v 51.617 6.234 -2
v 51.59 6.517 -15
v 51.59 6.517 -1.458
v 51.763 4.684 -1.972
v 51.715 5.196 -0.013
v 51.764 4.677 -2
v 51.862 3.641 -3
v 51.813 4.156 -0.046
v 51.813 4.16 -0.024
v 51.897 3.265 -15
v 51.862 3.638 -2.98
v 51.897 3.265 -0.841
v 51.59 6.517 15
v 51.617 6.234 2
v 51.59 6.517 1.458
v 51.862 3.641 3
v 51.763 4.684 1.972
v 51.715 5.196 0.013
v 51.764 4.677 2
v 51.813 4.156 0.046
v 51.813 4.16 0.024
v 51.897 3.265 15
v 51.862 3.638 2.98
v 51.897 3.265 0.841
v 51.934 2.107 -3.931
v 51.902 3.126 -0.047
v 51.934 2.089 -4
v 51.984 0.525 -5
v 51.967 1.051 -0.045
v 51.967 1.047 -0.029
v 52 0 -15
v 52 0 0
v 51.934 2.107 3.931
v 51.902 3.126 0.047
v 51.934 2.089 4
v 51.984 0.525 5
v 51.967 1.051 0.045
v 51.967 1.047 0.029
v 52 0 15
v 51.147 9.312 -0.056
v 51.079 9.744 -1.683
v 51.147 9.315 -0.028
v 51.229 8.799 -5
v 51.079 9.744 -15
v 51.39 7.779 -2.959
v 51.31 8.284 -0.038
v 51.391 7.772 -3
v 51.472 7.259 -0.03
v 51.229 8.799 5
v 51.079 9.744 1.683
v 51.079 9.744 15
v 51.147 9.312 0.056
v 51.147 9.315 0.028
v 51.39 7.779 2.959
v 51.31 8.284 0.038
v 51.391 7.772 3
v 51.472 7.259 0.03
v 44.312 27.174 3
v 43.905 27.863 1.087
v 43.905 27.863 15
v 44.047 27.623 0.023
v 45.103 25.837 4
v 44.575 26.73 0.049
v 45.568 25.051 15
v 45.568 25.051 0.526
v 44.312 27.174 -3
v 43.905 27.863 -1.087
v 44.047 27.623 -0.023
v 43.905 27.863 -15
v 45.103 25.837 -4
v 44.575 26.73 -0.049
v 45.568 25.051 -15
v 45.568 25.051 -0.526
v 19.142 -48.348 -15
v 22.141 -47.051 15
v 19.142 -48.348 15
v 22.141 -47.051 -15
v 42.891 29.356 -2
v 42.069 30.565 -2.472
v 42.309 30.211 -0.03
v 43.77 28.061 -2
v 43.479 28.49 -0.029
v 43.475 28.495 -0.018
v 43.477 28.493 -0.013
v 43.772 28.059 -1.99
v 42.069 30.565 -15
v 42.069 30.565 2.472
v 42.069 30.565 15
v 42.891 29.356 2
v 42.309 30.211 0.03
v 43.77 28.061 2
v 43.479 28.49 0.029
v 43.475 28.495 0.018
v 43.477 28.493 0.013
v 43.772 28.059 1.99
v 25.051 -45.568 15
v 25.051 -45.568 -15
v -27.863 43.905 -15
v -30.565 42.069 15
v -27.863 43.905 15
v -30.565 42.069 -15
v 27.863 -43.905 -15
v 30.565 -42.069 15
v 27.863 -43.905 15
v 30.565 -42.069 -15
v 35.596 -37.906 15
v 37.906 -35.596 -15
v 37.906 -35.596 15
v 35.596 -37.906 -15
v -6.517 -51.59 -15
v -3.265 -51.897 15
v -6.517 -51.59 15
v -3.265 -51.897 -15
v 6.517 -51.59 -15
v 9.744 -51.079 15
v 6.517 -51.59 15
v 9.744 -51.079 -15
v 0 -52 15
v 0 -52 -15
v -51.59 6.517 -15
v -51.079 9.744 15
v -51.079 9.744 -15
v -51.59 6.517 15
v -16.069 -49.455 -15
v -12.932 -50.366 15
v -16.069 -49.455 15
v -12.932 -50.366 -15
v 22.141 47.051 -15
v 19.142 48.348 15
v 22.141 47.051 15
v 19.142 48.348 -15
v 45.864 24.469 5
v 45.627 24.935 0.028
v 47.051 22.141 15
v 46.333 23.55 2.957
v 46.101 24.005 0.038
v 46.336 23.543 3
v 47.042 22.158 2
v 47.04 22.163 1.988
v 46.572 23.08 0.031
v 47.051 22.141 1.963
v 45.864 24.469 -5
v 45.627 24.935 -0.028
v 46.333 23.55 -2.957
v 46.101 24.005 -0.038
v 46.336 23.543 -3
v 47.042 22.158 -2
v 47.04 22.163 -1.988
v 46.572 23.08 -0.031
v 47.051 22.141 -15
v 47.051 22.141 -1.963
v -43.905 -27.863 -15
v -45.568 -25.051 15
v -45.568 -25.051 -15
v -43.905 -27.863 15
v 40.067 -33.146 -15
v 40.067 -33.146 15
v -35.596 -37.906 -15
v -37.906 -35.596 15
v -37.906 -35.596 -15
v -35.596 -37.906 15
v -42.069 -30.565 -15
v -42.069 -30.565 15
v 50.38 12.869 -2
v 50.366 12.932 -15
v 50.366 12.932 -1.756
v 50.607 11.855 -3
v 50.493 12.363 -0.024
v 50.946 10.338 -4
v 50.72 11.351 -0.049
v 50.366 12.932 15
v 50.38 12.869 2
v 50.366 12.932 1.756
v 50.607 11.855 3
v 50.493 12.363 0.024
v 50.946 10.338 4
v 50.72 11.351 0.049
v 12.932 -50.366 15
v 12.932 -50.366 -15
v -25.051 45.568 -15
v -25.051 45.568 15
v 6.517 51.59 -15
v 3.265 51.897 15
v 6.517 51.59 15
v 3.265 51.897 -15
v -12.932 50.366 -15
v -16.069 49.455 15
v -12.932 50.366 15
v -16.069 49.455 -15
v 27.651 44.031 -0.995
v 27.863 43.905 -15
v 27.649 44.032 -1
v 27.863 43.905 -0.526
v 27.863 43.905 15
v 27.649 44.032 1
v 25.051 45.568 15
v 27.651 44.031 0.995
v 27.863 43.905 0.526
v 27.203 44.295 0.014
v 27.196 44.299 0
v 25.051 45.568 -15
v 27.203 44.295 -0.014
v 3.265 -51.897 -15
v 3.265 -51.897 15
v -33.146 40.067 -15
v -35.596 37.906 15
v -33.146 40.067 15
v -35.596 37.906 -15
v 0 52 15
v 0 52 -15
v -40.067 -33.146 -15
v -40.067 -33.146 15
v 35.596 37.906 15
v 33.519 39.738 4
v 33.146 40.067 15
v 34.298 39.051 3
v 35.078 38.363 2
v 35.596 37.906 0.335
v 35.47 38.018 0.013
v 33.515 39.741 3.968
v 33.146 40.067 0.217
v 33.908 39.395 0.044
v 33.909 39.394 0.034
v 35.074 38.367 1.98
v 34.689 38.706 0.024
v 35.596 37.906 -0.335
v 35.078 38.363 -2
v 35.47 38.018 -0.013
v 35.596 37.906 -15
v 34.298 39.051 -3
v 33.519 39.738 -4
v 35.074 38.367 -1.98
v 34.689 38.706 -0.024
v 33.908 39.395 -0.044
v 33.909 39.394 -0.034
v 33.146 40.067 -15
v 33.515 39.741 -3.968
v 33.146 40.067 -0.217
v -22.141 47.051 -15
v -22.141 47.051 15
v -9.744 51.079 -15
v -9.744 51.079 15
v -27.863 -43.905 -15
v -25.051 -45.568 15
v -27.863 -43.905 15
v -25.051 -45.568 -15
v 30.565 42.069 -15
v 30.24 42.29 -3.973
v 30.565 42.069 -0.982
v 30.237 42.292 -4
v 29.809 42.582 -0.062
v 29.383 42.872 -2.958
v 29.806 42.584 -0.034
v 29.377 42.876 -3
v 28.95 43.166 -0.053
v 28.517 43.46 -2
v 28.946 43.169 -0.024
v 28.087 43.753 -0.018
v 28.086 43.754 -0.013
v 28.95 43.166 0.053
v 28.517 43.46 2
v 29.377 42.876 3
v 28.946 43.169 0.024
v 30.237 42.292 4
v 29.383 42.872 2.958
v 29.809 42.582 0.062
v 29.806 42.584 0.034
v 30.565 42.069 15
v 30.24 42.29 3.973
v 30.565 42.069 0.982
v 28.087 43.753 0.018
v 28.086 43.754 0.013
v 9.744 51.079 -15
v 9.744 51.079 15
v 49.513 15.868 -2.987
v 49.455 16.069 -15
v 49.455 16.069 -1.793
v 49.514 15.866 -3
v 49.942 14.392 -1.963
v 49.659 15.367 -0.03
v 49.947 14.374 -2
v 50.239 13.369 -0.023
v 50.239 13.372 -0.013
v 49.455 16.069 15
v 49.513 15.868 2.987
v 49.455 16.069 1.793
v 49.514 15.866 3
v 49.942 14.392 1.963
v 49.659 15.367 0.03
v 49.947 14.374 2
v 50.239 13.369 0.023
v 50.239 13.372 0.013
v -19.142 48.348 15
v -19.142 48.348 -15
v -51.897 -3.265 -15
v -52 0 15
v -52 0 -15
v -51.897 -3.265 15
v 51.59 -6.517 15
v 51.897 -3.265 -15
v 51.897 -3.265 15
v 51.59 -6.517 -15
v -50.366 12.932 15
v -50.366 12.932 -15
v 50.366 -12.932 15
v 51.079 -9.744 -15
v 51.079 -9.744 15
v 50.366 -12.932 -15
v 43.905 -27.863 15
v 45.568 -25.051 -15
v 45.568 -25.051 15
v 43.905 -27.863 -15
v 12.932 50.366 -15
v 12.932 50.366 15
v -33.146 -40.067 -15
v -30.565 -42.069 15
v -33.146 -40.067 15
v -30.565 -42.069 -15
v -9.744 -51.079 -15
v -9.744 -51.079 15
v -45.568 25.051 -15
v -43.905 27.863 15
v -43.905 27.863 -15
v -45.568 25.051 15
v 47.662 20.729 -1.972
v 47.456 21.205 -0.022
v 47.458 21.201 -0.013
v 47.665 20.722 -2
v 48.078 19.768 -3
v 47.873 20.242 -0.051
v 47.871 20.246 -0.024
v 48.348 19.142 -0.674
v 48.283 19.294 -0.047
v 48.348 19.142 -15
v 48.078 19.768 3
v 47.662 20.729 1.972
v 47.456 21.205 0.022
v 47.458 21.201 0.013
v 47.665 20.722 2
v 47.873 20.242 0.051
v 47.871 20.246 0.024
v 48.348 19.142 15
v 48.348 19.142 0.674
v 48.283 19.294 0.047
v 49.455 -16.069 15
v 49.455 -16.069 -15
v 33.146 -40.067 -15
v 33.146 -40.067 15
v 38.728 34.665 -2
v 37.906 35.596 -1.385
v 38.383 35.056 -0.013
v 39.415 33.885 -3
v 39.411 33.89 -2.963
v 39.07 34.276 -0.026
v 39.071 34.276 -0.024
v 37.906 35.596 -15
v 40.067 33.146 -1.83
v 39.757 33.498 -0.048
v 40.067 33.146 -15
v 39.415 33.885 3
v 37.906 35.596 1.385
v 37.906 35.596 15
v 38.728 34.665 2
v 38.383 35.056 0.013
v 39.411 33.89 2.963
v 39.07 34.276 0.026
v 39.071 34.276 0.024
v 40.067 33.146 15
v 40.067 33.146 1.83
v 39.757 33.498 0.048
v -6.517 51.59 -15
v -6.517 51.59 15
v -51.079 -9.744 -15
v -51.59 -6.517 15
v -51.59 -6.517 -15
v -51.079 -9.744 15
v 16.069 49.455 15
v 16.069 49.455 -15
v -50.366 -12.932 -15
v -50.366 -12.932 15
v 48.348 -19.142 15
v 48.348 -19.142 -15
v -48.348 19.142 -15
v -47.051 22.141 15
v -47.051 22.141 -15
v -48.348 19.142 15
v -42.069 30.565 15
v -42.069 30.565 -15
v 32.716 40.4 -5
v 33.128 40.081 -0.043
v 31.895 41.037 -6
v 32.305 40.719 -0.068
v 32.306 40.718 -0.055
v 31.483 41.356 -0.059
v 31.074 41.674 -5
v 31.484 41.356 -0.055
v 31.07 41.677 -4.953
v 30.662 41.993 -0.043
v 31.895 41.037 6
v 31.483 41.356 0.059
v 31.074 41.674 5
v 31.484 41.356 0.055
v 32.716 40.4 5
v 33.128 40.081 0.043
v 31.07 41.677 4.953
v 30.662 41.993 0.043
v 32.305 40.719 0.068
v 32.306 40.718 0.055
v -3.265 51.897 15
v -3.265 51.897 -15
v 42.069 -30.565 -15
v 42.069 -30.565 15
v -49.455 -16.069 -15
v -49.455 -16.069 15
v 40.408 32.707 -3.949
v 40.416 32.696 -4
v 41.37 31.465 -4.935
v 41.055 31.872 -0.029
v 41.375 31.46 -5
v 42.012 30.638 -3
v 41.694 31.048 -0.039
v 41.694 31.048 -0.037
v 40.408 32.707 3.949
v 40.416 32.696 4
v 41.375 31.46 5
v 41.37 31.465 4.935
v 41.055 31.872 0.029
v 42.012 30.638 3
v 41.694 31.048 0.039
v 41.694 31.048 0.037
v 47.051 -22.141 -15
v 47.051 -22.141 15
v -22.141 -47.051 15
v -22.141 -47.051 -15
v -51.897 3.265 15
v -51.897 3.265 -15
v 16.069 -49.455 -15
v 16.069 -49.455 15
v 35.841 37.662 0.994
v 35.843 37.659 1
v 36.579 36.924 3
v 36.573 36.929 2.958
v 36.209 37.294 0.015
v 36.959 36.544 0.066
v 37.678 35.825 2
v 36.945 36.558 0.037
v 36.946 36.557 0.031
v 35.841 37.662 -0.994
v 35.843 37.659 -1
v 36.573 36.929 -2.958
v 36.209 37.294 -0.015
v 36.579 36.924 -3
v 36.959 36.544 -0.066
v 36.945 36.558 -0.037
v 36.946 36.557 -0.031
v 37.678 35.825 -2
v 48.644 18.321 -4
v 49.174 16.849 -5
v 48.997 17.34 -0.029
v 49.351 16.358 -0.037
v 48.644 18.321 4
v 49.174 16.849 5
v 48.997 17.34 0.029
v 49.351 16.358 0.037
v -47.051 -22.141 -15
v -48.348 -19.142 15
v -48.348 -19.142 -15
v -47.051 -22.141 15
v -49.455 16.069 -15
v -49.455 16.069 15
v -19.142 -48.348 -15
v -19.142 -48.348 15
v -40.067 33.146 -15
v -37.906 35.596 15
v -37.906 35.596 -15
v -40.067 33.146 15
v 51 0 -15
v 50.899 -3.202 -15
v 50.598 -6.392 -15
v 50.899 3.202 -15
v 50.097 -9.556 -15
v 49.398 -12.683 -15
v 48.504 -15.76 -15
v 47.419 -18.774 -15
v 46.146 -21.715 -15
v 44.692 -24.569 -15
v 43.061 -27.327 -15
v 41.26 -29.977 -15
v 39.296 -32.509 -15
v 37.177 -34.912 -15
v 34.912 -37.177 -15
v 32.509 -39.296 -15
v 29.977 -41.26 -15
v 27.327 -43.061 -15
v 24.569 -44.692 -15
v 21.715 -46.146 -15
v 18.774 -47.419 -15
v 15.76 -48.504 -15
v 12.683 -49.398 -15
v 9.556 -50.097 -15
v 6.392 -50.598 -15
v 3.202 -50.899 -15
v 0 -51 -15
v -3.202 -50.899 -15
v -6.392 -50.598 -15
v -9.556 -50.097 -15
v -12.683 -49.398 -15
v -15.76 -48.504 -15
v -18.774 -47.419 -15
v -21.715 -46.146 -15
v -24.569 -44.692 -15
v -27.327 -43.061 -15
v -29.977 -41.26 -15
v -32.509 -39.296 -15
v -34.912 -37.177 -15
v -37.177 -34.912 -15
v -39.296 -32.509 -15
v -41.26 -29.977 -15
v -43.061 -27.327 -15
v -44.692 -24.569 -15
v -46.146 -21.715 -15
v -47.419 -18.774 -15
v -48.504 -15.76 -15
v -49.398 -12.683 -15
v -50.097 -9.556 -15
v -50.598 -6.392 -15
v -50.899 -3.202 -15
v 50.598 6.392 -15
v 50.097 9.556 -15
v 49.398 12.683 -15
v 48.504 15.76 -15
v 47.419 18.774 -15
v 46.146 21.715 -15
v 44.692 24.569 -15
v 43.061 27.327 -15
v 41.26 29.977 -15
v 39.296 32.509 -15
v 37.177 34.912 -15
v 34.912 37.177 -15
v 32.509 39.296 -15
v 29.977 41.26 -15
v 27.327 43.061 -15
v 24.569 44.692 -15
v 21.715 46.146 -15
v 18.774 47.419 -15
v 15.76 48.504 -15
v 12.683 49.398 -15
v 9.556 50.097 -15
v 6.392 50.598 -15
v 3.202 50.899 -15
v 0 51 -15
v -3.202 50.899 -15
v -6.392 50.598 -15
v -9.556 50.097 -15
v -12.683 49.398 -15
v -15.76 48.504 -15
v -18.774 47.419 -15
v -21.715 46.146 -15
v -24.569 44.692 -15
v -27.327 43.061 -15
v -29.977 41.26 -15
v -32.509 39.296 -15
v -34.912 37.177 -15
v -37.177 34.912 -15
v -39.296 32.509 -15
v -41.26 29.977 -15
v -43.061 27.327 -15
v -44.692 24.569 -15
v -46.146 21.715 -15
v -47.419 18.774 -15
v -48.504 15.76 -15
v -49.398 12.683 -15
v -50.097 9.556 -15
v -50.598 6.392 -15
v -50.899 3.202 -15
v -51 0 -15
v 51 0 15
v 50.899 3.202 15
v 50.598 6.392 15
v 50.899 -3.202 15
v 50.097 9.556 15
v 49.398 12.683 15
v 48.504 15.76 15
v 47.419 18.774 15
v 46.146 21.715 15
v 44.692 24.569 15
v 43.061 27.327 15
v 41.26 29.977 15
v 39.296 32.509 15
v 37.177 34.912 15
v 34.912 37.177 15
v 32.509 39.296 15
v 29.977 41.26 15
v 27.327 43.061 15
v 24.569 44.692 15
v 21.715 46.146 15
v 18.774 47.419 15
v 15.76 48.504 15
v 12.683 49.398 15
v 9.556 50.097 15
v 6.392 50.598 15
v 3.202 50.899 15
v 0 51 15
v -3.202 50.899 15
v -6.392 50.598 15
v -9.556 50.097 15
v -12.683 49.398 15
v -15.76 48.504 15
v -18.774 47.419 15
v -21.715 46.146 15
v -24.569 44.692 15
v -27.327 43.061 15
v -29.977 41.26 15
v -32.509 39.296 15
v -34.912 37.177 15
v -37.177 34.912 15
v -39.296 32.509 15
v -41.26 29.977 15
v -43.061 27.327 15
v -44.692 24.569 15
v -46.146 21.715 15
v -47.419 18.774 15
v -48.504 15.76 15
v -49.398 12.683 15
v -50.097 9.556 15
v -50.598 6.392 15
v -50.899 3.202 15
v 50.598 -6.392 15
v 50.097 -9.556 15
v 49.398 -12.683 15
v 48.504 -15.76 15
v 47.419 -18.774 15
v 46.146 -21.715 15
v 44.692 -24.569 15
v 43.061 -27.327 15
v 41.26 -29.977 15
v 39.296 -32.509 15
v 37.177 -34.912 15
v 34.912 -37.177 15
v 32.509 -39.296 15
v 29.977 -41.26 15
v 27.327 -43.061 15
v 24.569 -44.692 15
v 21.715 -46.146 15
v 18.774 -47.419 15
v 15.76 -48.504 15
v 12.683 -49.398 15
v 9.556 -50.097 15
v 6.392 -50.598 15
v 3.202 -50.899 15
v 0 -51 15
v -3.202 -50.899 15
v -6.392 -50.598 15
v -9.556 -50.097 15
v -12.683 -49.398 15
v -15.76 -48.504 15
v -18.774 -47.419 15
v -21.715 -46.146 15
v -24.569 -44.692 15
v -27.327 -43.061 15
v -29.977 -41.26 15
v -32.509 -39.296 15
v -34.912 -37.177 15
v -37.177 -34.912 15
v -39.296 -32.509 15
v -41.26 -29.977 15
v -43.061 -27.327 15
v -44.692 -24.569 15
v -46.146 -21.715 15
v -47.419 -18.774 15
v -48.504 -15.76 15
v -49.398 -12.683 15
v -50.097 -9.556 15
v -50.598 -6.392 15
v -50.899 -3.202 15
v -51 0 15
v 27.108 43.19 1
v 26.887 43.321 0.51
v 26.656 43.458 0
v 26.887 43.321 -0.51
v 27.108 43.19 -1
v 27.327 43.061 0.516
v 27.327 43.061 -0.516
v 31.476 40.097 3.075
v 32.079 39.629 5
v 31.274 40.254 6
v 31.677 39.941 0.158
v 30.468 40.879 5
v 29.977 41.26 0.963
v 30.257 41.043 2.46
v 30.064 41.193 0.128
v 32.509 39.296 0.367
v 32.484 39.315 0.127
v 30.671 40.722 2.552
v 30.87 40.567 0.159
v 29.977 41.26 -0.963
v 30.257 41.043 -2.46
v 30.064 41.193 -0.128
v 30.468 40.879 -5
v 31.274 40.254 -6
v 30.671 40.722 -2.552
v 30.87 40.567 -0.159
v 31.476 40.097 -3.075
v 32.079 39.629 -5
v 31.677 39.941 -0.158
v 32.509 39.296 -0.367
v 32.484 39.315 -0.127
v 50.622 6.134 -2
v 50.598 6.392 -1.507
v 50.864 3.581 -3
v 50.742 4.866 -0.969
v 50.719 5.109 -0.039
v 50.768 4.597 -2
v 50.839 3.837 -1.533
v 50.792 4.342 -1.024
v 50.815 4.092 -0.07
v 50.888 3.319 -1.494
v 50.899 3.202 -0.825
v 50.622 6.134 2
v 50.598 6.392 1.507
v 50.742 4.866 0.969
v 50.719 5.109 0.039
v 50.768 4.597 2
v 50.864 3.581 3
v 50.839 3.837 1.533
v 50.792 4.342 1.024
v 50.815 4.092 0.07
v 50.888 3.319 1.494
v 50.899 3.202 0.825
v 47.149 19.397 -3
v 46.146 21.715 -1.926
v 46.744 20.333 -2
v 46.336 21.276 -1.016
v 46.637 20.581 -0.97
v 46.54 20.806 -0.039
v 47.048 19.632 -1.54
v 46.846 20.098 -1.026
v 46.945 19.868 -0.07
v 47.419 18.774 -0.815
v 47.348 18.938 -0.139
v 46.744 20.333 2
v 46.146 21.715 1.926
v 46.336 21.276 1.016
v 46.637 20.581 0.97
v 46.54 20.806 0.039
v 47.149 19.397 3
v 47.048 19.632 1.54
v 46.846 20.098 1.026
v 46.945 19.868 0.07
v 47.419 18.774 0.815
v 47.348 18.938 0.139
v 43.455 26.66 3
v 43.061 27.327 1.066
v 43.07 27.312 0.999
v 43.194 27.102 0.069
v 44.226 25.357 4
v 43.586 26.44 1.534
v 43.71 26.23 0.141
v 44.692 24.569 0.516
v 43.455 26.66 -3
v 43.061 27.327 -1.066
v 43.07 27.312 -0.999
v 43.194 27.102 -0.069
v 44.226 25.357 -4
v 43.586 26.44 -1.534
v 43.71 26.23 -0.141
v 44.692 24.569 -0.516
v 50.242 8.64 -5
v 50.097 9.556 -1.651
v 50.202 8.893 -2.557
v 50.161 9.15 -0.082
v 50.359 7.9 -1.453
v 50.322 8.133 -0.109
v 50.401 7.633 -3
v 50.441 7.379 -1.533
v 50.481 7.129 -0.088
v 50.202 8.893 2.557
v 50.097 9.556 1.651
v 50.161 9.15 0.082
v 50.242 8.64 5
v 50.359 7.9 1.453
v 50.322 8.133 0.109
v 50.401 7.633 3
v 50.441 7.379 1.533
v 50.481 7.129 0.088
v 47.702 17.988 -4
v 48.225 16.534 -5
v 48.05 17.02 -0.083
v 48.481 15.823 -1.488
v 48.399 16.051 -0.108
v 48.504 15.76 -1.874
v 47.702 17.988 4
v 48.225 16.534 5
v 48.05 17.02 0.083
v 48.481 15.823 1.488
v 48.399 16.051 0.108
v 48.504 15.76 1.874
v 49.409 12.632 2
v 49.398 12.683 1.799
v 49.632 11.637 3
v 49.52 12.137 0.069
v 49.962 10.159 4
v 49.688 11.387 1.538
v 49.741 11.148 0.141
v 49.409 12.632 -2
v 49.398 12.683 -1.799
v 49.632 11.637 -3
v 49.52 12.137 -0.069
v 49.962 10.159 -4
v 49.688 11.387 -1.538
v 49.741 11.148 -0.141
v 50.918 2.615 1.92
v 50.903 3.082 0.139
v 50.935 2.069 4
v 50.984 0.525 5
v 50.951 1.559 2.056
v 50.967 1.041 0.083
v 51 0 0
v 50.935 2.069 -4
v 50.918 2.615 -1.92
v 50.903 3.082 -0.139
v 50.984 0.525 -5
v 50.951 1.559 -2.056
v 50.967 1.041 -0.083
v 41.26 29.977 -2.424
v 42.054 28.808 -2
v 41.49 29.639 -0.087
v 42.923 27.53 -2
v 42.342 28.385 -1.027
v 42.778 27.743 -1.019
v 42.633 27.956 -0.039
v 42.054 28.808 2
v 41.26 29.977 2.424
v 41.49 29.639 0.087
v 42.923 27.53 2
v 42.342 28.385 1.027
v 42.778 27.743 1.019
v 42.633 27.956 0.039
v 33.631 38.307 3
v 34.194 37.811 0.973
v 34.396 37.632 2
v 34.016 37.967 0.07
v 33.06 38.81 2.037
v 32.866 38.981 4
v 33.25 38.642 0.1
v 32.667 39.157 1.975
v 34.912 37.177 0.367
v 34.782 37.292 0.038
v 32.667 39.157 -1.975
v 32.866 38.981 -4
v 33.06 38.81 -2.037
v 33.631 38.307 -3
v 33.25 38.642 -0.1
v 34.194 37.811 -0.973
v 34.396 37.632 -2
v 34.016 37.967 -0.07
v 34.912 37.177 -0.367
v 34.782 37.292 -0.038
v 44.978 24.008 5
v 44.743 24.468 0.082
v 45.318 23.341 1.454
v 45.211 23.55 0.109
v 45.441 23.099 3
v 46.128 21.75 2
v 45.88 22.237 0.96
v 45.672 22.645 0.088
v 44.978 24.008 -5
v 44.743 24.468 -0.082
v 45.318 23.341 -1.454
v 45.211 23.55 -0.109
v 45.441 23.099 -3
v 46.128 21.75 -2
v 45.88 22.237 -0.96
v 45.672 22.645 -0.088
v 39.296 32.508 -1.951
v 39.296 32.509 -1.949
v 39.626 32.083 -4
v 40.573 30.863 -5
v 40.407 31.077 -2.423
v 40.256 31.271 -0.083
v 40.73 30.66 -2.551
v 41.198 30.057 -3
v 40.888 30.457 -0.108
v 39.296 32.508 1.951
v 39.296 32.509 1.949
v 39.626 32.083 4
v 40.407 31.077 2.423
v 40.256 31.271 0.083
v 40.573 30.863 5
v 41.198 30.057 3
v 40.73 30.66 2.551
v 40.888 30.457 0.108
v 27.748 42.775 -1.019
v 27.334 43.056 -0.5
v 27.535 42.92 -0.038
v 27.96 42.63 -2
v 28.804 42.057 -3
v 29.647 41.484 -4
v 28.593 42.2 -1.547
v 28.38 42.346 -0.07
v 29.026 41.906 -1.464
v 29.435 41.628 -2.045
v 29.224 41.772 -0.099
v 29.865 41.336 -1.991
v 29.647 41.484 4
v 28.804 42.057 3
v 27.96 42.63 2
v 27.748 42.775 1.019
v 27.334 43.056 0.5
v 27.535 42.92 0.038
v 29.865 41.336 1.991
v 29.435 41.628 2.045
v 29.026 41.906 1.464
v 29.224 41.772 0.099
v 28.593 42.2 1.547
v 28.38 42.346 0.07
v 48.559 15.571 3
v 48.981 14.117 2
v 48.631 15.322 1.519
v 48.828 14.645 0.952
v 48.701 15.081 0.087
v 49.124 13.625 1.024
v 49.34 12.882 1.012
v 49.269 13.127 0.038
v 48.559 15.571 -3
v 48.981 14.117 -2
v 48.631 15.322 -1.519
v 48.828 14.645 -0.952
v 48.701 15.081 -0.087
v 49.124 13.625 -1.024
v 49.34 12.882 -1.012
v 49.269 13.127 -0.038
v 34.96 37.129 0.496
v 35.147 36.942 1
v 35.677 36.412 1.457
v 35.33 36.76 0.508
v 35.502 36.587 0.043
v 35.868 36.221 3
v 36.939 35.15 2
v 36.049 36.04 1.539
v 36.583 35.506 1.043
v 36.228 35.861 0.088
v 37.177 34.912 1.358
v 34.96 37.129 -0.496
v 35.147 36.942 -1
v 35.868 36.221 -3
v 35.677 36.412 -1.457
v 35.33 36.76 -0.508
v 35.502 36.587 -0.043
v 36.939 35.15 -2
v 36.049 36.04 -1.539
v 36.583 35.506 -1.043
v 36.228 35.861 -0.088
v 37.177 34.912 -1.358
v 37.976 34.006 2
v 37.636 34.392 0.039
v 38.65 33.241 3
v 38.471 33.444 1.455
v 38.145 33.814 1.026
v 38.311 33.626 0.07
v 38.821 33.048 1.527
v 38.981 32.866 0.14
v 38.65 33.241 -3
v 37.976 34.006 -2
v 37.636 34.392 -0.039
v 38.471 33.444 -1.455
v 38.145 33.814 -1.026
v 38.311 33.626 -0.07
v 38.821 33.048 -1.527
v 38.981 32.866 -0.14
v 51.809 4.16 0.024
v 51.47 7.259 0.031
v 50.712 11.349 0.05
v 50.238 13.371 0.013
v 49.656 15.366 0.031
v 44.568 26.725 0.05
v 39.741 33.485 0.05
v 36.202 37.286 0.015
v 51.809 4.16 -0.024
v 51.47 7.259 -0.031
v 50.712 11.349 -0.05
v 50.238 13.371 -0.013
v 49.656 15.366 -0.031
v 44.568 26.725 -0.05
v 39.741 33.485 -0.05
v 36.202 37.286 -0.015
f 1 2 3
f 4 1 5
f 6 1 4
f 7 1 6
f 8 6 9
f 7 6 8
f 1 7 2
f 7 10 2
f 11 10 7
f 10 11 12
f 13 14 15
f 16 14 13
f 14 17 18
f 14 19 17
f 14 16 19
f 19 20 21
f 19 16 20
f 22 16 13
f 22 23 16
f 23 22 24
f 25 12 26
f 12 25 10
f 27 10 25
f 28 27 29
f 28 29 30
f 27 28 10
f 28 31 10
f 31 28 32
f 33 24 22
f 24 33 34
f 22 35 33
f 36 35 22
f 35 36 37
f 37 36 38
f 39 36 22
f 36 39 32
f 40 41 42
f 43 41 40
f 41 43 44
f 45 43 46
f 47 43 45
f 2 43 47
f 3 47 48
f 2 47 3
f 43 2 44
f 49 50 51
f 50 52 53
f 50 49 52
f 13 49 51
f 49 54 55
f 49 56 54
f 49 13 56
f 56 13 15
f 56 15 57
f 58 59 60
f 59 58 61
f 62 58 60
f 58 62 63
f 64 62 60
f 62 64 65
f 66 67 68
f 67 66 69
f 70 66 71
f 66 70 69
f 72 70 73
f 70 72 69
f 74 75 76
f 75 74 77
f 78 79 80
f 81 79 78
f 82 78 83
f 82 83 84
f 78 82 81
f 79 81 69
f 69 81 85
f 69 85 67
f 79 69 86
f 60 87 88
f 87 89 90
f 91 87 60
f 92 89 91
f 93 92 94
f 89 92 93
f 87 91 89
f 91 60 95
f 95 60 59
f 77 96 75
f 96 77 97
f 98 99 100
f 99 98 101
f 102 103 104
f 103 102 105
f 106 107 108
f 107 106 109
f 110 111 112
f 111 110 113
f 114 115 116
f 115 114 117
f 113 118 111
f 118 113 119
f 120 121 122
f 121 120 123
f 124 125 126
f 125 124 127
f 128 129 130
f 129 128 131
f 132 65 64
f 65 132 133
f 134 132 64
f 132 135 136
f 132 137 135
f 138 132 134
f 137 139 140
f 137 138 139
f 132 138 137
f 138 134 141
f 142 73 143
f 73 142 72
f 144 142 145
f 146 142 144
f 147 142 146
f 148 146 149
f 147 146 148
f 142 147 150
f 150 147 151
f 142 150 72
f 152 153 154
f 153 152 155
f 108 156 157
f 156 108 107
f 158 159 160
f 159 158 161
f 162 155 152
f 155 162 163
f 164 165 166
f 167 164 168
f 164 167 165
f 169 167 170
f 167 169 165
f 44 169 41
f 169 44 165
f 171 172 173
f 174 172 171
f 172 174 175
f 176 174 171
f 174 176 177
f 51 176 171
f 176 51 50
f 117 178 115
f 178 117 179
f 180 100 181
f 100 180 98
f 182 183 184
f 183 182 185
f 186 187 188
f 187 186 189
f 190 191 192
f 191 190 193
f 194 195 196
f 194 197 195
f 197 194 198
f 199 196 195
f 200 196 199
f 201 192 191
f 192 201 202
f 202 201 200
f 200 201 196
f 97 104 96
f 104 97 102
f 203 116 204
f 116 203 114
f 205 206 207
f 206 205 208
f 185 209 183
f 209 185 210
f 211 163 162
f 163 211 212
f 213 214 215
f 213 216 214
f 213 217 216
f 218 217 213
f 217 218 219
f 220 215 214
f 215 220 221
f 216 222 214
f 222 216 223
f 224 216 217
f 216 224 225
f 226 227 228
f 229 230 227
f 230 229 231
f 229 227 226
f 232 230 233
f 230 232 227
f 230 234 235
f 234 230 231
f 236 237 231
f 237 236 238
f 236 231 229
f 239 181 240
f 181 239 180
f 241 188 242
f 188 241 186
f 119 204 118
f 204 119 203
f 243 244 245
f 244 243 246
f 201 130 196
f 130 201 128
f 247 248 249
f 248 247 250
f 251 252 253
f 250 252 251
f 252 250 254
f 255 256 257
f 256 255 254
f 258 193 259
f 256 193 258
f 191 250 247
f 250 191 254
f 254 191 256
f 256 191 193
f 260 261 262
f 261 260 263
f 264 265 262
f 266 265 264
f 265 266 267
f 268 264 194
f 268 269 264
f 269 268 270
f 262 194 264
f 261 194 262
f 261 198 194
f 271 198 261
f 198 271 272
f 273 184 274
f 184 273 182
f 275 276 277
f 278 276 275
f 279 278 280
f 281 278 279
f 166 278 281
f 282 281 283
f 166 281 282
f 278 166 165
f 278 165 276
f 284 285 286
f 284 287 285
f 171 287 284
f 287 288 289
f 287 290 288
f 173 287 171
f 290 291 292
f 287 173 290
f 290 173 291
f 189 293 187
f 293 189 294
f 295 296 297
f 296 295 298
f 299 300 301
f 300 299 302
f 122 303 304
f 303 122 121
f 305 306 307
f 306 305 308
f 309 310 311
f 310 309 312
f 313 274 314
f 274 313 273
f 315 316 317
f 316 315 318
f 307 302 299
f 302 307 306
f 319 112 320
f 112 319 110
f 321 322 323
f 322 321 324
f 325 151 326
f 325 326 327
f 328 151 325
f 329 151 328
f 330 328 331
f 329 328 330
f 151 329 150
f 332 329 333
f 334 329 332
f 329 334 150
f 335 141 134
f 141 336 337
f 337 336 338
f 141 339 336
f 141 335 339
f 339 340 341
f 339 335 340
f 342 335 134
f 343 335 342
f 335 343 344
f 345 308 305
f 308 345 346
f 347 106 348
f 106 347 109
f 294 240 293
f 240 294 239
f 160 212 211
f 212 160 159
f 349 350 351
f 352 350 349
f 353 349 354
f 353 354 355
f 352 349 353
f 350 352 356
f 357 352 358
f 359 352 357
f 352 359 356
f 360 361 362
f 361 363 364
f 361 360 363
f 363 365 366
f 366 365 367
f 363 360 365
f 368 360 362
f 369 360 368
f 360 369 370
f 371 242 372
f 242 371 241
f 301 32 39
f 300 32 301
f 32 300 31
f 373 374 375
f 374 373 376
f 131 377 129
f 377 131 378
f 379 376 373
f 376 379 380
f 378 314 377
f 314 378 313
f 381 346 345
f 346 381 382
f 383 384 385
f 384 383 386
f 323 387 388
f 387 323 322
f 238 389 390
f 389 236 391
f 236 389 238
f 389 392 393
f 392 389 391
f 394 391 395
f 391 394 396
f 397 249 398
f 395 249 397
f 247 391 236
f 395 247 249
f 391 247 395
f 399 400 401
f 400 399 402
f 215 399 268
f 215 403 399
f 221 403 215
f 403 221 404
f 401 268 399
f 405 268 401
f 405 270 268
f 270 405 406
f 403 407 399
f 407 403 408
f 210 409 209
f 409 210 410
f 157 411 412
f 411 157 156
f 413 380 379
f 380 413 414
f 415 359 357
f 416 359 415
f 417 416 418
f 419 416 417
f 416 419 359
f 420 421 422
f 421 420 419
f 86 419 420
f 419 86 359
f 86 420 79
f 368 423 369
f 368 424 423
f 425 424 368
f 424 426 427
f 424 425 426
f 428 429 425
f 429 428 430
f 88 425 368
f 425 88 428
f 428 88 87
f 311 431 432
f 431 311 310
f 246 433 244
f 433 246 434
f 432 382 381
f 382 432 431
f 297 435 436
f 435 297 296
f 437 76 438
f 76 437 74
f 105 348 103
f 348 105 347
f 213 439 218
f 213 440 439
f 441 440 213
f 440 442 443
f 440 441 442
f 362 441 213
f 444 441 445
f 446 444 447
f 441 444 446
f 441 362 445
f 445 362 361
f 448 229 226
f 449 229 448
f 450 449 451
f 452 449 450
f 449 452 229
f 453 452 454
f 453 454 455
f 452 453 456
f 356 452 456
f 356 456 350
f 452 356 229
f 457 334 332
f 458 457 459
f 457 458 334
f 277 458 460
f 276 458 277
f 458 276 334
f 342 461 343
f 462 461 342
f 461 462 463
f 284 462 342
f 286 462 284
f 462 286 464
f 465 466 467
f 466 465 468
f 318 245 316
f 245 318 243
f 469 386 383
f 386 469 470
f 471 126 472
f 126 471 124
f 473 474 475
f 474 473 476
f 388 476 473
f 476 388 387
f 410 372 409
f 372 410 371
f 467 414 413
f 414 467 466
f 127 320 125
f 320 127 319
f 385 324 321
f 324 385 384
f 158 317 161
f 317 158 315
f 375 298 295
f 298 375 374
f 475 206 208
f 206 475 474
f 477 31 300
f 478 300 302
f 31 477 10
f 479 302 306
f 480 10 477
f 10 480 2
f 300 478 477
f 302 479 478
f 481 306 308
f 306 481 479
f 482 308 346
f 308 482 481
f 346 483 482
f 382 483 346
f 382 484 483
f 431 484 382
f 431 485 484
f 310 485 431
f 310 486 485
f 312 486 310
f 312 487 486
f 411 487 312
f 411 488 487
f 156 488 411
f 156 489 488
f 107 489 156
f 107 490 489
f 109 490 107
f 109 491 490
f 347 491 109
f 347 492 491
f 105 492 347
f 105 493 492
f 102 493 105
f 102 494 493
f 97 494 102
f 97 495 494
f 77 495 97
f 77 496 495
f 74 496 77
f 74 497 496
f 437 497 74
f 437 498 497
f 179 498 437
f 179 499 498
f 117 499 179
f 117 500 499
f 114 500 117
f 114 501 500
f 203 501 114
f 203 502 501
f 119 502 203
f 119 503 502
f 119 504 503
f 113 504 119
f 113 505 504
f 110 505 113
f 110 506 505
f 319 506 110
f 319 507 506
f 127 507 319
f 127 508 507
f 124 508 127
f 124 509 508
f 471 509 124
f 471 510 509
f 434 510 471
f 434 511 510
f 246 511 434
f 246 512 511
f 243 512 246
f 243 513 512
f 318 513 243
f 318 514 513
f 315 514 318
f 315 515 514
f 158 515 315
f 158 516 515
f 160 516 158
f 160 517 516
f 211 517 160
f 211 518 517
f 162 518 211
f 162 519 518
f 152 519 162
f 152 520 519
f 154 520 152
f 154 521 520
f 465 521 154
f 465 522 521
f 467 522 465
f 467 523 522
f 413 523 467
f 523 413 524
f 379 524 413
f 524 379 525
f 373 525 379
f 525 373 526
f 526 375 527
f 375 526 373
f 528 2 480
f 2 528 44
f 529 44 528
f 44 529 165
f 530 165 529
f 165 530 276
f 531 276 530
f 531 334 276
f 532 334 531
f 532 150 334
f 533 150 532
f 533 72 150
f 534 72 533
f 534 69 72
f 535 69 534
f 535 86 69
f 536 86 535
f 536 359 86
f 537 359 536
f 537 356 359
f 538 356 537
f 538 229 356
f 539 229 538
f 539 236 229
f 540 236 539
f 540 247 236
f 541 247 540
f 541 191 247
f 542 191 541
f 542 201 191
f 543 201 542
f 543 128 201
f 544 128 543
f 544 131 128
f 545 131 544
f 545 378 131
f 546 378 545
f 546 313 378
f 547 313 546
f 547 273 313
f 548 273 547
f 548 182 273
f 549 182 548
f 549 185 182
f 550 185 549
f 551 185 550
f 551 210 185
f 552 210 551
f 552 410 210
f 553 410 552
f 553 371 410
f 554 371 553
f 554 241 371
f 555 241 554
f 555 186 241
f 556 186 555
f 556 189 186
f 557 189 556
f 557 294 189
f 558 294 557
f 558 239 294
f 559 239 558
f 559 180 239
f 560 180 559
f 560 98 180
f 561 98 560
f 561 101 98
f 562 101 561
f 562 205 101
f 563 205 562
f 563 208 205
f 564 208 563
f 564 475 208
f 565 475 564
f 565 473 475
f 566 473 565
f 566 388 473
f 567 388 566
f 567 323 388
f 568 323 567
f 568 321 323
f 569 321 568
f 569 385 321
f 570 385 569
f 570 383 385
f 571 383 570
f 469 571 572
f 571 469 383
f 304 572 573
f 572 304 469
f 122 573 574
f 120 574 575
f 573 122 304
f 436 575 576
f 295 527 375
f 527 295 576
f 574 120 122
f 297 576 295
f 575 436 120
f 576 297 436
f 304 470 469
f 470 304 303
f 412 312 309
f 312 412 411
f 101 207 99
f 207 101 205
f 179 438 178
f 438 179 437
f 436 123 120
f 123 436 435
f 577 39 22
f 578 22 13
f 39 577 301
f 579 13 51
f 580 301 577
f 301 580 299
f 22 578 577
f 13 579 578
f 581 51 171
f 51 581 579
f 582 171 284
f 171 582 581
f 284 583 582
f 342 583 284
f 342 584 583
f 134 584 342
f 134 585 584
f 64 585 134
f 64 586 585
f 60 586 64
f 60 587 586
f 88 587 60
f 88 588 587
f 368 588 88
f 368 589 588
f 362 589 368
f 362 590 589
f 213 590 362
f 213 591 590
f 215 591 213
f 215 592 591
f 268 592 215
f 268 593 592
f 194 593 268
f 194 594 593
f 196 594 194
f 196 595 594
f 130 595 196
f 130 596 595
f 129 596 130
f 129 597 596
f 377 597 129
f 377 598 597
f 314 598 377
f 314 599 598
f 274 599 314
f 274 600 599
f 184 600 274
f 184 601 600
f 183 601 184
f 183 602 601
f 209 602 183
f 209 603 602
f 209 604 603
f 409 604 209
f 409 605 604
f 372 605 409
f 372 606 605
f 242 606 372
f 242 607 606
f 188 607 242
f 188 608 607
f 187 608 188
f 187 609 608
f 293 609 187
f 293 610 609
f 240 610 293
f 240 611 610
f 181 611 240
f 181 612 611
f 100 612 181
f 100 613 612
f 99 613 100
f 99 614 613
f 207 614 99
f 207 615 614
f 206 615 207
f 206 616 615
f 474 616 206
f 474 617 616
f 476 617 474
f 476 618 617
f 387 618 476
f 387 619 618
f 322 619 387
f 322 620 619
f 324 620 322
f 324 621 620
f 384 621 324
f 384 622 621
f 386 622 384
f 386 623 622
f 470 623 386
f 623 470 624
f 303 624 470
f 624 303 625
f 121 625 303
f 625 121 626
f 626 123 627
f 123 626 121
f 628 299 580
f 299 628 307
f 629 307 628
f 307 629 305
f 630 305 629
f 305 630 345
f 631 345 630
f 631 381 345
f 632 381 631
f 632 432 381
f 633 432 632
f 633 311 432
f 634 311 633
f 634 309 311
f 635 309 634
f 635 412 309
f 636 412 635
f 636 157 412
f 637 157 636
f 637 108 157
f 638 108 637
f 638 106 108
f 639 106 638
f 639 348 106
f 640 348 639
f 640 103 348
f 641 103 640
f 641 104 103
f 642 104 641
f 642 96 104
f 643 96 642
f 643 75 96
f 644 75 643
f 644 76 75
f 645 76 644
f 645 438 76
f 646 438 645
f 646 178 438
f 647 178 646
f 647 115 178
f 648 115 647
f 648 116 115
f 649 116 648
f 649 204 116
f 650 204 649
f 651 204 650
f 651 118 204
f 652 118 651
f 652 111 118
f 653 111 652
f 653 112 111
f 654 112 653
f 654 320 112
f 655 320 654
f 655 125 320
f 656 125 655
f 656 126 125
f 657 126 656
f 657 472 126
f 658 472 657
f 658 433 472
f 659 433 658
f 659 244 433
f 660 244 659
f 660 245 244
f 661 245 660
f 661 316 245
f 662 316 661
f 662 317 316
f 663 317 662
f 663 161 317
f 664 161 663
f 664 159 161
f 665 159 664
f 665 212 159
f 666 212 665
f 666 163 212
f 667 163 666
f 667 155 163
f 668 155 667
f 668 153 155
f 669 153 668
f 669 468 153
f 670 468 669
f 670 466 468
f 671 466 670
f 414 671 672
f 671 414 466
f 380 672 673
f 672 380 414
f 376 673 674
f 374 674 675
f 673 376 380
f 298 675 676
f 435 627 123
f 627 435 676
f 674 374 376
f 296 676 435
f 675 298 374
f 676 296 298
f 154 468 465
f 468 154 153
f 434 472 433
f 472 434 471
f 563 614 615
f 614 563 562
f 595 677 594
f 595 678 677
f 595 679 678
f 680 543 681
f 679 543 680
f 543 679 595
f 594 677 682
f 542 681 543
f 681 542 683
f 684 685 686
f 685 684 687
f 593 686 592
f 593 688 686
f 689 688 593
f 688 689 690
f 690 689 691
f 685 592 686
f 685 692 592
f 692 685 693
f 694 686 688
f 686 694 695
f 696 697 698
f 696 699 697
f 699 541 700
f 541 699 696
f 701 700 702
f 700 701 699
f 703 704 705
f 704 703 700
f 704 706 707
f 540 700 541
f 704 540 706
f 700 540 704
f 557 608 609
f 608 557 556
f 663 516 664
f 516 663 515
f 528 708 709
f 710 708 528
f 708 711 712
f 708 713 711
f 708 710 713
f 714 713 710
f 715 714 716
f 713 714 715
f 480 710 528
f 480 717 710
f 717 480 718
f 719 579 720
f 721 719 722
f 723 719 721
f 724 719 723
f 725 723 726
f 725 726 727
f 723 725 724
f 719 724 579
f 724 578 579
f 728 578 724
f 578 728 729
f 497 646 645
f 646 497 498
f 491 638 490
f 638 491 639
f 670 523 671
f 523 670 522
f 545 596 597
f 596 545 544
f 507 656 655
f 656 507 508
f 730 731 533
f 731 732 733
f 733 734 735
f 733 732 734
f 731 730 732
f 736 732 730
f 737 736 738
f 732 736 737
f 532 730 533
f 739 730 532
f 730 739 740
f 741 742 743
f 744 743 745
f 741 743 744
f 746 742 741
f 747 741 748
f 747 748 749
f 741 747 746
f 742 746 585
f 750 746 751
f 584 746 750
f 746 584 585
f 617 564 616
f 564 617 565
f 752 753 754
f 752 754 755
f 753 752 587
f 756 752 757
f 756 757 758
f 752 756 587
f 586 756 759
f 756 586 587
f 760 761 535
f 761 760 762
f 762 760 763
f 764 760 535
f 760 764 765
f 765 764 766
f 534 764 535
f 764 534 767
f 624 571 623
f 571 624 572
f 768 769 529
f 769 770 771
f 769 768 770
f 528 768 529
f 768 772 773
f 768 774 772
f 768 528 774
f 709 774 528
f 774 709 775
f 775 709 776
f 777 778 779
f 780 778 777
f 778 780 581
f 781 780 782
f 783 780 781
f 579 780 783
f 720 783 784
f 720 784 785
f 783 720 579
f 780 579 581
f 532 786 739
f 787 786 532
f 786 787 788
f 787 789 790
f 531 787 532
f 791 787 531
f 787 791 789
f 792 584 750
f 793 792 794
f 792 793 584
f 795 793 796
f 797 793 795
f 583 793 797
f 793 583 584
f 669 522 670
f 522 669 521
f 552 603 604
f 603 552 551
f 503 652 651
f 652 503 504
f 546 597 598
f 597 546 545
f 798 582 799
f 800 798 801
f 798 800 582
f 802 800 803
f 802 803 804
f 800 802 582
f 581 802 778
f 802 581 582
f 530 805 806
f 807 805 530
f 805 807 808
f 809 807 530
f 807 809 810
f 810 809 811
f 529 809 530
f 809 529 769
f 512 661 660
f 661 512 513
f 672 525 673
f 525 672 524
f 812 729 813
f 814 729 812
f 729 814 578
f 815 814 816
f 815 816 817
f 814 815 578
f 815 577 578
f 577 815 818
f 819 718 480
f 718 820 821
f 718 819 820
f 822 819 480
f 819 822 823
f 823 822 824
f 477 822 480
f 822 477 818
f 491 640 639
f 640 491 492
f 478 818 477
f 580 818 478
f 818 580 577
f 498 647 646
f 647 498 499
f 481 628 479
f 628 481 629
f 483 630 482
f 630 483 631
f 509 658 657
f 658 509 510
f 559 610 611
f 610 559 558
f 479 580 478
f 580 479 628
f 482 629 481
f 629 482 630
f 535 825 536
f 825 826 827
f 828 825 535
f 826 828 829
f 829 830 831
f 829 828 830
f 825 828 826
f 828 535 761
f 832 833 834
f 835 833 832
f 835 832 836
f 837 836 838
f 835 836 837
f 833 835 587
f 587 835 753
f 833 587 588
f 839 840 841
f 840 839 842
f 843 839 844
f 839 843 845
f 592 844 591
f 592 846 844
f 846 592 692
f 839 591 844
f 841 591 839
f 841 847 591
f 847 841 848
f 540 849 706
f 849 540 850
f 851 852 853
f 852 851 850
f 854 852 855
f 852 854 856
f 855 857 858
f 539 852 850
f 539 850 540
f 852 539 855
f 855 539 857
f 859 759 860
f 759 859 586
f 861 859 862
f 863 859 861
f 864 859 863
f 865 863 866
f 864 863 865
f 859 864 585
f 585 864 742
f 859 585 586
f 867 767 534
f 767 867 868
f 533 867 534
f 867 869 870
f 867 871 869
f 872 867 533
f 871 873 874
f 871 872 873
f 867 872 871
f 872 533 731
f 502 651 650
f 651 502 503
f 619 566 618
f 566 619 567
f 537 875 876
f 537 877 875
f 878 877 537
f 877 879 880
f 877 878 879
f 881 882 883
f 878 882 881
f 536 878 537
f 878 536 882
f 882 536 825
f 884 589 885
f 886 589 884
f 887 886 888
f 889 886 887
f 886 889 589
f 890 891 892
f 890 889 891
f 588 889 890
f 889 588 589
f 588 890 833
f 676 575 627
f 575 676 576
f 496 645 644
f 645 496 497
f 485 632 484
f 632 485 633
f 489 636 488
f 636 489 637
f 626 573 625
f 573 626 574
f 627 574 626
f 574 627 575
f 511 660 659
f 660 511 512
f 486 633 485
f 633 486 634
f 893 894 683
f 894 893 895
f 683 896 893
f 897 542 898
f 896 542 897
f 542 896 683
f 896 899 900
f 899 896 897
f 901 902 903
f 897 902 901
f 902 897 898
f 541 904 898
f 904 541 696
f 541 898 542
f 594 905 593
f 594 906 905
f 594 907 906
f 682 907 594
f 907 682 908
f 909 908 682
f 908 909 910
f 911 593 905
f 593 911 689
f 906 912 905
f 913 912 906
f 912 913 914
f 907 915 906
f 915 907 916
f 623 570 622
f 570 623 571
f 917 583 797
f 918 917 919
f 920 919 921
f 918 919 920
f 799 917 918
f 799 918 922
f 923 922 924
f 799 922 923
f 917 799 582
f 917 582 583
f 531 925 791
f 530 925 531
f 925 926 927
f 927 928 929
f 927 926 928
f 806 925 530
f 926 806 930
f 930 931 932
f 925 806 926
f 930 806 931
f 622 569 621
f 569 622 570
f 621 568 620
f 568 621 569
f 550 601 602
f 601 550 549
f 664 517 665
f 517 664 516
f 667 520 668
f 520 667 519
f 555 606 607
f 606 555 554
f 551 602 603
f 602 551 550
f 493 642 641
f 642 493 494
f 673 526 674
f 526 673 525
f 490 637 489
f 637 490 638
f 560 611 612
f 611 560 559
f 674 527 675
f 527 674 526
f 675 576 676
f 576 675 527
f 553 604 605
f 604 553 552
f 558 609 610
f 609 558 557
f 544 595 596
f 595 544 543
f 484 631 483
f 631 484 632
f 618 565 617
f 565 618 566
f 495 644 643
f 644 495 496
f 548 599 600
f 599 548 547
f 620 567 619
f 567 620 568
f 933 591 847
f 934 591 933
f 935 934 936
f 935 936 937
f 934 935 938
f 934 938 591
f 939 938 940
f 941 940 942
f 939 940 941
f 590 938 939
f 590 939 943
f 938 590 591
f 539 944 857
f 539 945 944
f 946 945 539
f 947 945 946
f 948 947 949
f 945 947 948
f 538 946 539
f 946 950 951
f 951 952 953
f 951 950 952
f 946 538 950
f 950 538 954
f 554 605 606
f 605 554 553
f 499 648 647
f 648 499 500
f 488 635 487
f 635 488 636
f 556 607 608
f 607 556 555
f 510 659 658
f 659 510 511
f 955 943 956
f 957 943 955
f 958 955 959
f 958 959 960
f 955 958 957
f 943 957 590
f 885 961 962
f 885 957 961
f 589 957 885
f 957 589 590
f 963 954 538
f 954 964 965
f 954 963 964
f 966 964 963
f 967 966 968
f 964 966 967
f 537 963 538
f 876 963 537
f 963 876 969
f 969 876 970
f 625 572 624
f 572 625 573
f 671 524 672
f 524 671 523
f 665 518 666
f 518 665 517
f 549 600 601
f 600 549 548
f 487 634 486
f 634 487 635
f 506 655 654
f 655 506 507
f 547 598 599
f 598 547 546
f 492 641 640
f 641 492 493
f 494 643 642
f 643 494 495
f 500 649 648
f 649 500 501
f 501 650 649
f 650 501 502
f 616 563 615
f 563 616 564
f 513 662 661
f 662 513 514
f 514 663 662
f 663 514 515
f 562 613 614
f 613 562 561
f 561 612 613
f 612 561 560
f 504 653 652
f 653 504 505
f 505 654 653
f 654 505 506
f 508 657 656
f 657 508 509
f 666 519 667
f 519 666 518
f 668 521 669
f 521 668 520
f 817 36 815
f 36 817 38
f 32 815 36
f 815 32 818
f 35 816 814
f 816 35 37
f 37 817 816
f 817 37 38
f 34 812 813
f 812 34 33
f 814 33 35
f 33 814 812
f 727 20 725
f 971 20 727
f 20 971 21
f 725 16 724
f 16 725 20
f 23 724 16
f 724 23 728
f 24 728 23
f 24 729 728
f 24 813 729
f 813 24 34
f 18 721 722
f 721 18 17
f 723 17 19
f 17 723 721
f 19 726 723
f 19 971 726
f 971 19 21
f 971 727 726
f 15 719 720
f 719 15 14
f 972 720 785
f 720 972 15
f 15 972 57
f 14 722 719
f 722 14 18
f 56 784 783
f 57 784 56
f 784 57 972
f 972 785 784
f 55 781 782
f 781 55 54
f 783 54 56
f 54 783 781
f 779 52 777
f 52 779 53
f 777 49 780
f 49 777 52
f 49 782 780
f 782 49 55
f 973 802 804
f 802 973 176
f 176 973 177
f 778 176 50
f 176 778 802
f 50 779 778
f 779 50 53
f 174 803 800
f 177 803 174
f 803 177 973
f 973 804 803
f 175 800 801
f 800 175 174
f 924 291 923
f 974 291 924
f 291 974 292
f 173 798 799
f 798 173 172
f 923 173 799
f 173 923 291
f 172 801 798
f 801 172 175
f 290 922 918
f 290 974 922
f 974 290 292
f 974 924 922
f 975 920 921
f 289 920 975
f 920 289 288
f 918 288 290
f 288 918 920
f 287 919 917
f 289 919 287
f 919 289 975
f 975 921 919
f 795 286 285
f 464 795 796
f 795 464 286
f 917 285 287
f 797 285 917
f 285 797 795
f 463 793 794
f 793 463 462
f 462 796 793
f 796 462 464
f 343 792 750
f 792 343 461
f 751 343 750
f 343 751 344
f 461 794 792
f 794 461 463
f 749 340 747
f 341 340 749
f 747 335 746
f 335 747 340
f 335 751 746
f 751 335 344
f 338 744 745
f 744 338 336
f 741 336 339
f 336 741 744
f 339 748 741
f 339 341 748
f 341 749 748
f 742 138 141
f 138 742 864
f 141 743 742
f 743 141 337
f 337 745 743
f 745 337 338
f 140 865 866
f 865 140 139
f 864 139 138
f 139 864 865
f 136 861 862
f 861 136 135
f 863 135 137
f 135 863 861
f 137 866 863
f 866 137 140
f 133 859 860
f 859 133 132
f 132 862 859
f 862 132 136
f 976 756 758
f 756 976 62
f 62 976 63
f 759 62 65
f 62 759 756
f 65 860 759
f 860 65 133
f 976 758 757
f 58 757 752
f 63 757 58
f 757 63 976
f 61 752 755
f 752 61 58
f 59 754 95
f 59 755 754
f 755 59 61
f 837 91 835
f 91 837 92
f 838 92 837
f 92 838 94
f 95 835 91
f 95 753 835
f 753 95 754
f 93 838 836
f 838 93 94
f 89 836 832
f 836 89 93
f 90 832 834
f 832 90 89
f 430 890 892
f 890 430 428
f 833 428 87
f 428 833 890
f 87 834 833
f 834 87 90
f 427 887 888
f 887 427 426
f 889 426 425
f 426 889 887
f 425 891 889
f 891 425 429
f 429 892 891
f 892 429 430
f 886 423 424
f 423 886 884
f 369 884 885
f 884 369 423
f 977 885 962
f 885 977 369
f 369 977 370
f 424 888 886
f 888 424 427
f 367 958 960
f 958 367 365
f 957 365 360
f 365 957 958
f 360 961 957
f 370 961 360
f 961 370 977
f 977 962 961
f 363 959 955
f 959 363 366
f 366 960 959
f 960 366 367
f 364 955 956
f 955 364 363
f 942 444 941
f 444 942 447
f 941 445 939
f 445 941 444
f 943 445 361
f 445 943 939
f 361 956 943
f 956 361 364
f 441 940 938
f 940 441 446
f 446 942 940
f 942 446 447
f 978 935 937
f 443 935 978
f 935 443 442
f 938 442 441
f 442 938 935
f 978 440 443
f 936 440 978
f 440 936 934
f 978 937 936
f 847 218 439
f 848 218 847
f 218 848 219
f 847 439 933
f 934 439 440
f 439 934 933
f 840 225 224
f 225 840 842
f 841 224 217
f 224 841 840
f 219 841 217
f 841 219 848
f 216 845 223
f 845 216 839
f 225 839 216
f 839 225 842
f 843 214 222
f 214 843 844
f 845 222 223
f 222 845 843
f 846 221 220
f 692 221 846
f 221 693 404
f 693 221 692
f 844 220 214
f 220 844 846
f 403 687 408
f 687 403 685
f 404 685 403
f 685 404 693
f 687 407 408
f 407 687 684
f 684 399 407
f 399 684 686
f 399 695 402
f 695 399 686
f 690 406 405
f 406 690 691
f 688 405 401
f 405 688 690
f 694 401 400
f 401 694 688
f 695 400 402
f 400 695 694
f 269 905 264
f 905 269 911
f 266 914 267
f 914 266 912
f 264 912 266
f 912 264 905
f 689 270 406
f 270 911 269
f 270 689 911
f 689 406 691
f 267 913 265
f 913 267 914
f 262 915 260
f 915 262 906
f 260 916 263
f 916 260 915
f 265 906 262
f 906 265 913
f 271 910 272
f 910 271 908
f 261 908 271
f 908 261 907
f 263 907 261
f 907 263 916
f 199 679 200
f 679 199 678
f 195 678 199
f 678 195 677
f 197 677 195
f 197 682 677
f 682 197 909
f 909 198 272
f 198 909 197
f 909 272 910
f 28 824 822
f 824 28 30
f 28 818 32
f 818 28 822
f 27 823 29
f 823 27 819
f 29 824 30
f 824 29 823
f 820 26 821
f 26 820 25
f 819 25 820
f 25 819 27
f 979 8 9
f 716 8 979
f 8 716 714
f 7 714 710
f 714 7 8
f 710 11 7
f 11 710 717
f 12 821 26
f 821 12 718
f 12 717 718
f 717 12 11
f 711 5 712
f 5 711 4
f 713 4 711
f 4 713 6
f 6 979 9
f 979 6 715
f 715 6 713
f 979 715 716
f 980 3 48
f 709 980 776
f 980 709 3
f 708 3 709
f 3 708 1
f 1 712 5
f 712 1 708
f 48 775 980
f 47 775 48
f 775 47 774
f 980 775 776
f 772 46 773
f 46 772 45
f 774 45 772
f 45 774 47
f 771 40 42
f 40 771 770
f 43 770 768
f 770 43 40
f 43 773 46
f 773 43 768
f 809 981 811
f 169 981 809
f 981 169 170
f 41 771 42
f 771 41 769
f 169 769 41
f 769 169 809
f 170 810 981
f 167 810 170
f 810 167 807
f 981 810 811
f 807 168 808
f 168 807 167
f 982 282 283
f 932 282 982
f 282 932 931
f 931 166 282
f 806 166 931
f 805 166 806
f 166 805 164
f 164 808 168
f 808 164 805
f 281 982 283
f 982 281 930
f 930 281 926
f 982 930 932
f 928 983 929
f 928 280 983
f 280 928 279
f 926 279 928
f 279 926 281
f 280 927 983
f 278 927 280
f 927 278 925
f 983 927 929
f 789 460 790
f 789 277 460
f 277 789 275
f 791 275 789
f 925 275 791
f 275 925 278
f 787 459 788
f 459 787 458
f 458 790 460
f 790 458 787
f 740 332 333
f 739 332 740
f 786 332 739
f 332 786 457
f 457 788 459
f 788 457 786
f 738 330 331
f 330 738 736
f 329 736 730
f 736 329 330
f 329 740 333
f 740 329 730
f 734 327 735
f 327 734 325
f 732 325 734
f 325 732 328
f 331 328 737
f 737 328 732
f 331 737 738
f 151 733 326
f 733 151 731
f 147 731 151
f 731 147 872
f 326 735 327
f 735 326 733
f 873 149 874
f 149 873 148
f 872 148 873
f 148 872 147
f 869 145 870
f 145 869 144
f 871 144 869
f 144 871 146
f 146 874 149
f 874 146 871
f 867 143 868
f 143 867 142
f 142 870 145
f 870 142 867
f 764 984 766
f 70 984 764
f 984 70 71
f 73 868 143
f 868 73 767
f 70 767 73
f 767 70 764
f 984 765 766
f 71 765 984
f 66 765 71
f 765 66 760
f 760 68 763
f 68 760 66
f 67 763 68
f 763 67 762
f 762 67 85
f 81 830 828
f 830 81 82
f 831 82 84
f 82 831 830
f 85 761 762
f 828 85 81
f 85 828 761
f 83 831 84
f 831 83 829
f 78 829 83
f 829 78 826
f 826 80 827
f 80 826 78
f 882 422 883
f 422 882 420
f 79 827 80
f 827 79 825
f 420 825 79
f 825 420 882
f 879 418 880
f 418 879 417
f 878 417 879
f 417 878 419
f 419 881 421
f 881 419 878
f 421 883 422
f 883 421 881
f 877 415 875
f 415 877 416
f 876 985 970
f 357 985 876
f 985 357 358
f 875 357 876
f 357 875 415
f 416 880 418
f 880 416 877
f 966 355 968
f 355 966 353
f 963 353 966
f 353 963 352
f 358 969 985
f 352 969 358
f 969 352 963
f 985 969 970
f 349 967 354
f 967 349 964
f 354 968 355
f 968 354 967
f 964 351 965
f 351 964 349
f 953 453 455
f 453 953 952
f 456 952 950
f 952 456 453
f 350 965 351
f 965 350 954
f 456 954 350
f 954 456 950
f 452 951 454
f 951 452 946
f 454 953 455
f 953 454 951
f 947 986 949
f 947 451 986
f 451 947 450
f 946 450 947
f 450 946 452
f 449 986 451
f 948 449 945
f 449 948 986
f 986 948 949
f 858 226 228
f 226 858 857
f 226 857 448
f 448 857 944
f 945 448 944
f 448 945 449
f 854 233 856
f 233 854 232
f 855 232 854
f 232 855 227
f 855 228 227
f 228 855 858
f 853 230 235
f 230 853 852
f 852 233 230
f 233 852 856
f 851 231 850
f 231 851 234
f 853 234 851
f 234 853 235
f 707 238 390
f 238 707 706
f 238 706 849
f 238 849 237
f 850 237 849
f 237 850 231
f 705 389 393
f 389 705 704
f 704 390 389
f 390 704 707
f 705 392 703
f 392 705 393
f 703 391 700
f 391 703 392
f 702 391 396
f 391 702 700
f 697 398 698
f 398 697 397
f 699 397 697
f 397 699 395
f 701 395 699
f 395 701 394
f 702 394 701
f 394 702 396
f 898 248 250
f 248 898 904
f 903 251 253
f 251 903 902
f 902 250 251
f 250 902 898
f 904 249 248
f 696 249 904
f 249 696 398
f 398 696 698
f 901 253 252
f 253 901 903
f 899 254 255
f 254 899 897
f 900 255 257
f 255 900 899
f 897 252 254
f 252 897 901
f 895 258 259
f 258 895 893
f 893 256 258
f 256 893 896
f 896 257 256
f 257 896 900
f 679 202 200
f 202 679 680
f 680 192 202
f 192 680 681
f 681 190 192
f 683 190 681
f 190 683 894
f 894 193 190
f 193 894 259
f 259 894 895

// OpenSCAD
$fn=100;
angle = 180;
wavePeaks = [5,4,3,2,2,3,5,4,3,2,2,3,5,4,3,2,2,3,5,4,3,2,2,3,5,4,3,2,2,3,1,2,3,4,5,6,5,4,3,2,1];
waveDistances = [1,2,1,1,2,1,1,2,1,1,2,1,1,2,1,1,2,1,1,2,1,1,2,1,1,2,1,1,2,1,1,1,1,1,1,1,1,1,1,1,1];
r = 50;
circ = r*2*pi();

length = sum(waveDistances,len(waveDistances)-1,0);

function pi()=3.14159265358979323846;
function sum(v,i,s=0) = (i==s ? v[i] : v[i] + sum(v,i-1,s));
function trans(i) = [cos(i)*r,sin(i)*r];
function angle(i) = 360/circ*i;

module dxf() {
    import("dxf.dxf");
}

module wave() {
    //for(i=[0,1])mirror([0,i,0])
    for(i=[0:len(waveDistances)]) {
        distance = waveDistances[i];
        translate([sum(waveDistances,i,0)-waveDistances[i],0])
            polygon(points=[[0,0],[distance,0],[1/2*distance,wavePeaks[i]]]);
    }
}

module waveExtrusion() {
    for(i=[0,1])mirror([0,0,i])for(i=[0:len(waveDistances)-1]) {
        distance = waveDistances[i]*1.05;
        a = angle(sum(waveDistances,i,0)-waveDistances[i]);
        translate(trans(a))rotate(a=[0,0,a])rotate(a=[90,0,90])
                linear_extrude(height=2)polygon(points=[[0,0],[distance,0],[1/2*distance,wavePeaks[i]]]);
                    
    }
}    
module ring() {
    difference() {
        cylinder(r=52,h=30,center=true);
        cylinder(r=51,h=30,center=true);
    }
}
difference() {
    ring();
    waveExtrusion();
}
